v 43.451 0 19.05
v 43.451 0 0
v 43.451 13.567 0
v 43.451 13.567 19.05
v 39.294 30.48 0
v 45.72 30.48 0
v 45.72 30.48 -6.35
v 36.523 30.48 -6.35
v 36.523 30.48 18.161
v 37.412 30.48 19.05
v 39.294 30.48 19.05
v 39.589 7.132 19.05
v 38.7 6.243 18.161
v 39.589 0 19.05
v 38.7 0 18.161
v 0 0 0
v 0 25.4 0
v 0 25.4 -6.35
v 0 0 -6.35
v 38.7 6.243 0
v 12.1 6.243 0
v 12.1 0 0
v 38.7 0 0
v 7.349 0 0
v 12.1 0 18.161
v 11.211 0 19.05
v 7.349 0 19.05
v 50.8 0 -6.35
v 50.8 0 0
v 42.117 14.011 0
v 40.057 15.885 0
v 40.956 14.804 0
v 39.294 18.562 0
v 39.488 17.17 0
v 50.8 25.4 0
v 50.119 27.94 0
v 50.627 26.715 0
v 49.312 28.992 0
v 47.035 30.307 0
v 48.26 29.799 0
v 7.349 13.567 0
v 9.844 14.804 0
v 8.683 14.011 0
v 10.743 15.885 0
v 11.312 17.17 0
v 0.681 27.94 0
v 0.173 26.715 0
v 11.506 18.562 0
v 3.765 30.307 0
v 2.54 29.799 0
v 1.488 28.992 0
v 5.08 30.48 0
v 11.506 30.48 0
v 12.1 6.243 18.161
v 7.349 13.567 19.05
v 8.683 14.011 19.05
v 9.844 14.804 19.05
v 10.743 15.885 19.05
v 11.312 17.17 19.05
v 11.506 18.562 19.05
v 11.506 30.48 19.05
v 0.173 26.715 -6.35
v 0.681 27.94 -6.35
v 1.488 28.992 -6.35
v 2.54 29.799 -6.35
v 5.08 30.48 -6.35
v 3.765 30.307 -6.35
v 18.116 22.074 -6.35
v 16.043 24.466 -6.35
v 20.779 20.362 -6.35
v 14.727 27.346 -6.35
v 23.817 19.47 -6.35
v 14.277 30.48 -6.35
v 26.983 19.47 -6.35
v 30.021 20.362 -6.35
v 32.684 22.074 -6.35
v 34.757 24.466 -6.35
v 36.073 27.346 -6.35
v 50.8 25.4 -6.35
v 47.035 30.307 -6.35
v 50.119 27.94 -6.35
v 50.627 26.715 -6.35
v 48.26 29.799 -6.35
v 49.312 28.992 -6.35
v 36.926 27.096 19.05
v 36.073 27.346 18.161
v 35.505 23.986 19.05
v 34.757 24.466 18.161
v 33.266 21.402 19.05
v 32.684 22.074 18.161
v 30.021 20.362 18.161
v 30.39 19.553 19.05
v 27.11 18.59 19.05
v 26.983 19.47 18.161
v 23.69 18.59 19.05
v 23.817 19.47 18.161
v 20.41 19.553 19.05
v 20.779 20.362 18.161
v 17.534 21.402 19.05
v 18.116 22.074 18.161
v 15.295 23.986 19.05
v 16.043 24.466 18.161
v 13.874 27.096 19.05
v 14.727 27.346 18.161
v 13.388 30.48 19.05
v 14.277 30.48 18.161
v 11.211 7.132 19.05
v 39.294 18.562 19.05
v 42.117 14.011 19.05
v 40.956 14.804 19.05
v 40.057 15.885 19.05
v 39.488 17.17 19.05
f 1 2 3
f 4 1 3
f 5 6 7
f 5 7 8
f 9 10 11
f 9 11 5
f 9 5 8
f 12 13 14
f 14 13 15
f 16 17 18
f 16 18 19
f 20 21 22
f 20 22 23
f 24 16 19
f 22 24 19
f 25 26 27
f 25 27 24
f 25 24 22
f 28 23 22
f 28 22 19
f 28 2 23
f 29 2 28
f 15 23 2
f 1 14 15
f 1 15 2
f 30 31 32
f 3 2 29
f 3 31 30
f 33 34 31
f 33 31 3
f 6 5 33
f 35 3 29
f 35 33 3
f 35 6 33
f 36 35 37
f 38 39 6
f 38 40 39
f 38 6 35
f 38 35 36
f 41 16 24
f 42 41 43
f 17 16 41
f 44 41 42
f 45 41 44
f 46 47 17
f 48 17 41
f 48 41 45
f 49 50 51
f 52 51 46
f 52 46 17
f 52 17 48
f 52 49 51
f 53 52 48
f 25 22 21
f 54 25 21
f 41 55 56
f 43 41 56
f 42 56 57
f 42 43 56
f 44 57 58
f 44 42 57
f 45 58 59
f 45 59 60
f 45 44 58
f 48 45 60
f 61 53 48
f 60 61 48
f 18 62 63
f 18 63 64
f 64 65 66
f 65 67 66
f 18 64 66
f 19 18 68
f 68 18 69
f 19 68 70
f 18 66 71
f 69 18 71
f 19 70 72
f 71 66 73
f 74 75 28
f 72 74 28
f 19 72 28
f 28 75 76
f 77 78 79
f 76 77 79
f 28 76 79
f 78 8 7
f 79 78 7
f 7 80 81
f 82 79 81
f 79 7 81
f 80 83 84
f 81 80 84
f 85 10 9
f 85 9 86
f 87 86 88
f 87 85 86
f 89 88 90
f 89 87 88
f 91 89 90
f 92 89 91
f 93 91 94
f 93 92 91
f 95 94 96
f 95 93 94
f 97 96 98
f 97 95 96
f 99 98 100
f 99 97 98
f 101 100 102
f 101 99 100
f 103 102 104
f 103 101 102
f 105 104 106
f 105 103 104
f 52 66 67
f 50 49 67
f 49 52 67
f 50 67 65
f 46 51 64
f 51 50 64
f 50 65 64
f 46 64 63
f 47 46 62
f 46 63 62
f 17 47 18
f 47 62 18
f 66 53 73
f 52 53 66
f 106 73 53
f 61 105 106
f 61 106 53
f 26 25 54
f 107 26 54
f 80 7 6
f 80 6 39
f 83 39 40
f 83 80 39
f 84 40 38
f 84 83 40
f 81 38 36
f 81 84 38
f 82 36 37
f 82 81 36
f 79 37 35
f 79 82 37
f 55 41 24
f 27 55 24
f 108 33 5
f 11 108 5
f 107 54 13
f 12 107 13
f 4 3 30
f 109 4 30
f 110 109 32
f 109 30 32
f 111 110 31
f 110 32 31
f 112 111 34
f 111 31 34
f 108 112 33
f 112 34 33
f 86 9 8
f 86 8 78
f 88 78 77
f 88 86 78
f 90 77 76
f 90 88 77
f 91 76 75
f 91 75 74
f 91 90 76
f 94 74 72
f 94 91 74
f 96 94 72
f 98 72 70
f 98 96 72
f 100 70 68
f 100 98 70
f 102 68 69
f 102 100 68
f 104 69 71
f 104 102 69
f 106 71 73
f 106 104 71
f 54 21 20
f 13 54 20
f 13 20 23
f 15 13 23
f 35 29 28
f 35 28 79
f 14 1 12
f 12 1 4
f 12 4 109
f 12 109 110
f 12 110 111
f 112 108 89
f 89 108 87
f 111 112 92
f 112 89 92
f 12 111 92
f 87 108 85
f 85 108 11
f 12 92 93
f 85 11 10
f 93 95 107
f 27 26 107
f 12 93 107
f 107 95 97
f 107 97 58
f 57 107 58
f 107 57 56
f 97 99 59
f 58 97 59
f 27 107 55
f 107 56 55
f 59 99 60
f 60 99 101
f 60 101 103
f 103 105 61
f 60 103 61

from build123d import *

# Parameters (mm, degrees)
F1_DEPTH     = 19.05
F0_W         = 26.6001702666
F0_H         = 6.2427259982
F2_DEPTH     = 6.35
F3_T1_DEPTH  = 19.05
F3_T6_DEPTH  = 31.5386260012
F3_T8_DEPTH  = 31.75
F3_T10_DEPTH = 31.75
F4_SIZE      = 0.889


# Not quite as in the source:
# - a fillet or chamfer that OpenCascade refuses, or shapes differently, is made with other operations: its cross-section is extruded or revolved along the edge and cut away or added


with BuildPart() as f1:
    # F0 (on Top) → F1 (new body)
    with BuildSketch(Plane.XY):
        with BuildLine():
            Line((7.349026072, 13.5670155287), (7.349026072, 0))
            Line((7.349026072, 0), (12.0999148667, 0))
            Line((12.0999148667, 0), (12.0999148667, 6.2427259982))
            Line((12.0999148667, 6.2427259982), (38.7000851333, 6.2427259982))
            Line((38.7000851333, 6.2427259982), (38.7000851333, 0))
            Line((38.7000851333, 0), (43.450973928, 0))
            Line((43.450973928, 0), (43.450973928, 13.5670155287))
            Line((43.450973928, 13.5670155287), (39.2939448357, 13.5670155287))
            Line((39.2939448357, 13.5670155287), (39.2939448357, 30.48))
            Line((39.2939448357, 30.48), (36.5231766516, 30.48))
            ThreePointArc((36.5231766516, 30.48), (25.4, 19.3568233484), (14.2768233484, 30.48))
            Line((14.2768233484, 30.48), (11.5060551643, 30.48))
            Line((11.5060551643, 30.48), (11.5060551643, 13.5670155287))
            Line((11.5060551643, 13.5670155287), (7.349026072, 13.5670155287))
        make_face()
    extrude(amount=F1_DEPTH)

    # F0 (on Top) → F2 (join)
    with BuildSketch(Plane.XY):
        Polygon((0, 30.48), (0, 0), (7.349026072, 0), (7.349026072, 13.5670155287), (11.5060551643, 13.5670155287), (11.5060551643, 30.48), align=None)
        with Locations((25.4, 3.1213629991)):
            Rectangle(F0_W, F0_H)
        Polygon((43.450973928, 13.5670155287), (43.450973928, 0), (50.8, 0), (50.8, 30.48), (39.2939448357, 30.48), (39.2939448357, 13.5670155287), align=None)
        with BuildLine():
            Line((7.349026072, 13.5670155287), (7.349026072, 0))
            Line((7.349026072, 0), (12.0999148667, 0))
            Line((12.0999148667, 0), (12.0999148667, 6.2427259982))
            Line((12.0999148667, 6.2427259982), (38.7000851333, 6.2427259982))
            Line((38.7000851333, 6.2427259982), (38.7000851333, 0))
            Line((38.7000851333, 0), (43.450973928, 0))
            Line((43.450973928, 0), (43.450973928, 13.5670155287))
            Line((43.450973928, 13.5670155287), (39.2939448357, 13.5670155287))
            Line((39.2939448357, 13.5670155287), (39.2939448357, 30.48))
            Line((39.2939448357, 30.48), (36.5231766516, 30.48))
            ThreePointArc((36.5231766516, 30.48), (25.4, 19.3568233484), (14.2768233484, 30.48))
            Line((14.2768233484, 30.48), (11.5060551643, 30.48))
            Line((11.5060551643, 30.48), (11.5060551643, 13.5670155287))
            Line((11.5060551643, 13.5670155287), (7.349026072, 13.5670155287))
        make_face()
    extrude(amount=-F2_DEPTH)

    # F3: fillet of radius 5.08 on 4 edges, made by hand

    # F3_s2 → F3_t1 (join)
    with BuildSketch(Plane.XY):
        with BuildLine():
            ThreePointArc((7.349026072, 13.5670155287), (10.3308658007, 15.3130269169), (11.5060551643, 18.5624659292))
            Line((11.5060551643, 18.5624659292), (11.5060551643, 13.5670155287))
            Line((11.5060551643, 13.5670155287), (7.349026072, 13.5670155287))
        make_face()
    extrude(amount=F3_T1_DEPTH)


with BuildPart() as f3_tool4:
    # F3_s5 → F3_t6 (new body)
    with BuildSketch(Plane.XY.offset(-12.4886260012)):
        with BuildLine():
            ThreePointArc((43.450973928, 13.5670155287), (40.4691341993, 15.3130269169), (39.2939448357, 18.5624659292))
            Line((39.2939448357, 18.5624659292), (39.2939448357, 13.5670155287))
            Line((39.2939448357, 13.5670155287), (43.450973928, 13.5670155287))
        make_face()
    extrude(amount=F3_T6_DEPTH)

    split(bisect_by=Plane.XY.offset(-6.35), keep=Keep.TOP)


with BuildPart() as f1_1:
    add(f1.part)

    # F3_t3: union F3_tool4
    add(f3_tool4.part)

    # F3_s9 → F3_t8 (cut)
    with BuildSketch(Plane.XY.offset(-19.05)):
        with BuildLine():
            ThreePointArc((5.08, 30.48), (1.4878975516, 28.9921024484), (0, 25.4))
            Line((0, 25.4), (0, 30.48))
            Line((0, 30.48), (5.08, 30.48))
        make_face()
    extrude(amount=F3_T8_DEPTH, mode=Mode.SUBTRACT)

    # F3_s11 → F3_t10 (cut)
    with BuildSketch(Plane.XY.offset(-19.05)):
        with BuildLine():
            ThreePointArc((45.72, 30.48), (49.3121024484, 28.9921024484), (50.8, 25.4))
            Line((50.8, 25.4), (50.8, 30.48))
            Line((50.8, 30.48), (45.72, 30.48))
        make_face()
    extrude(amount=F3_T10_DEPTH, mode=Mode.SUBTRACT)

    # F4
    f4_edges = [f1_1.edges().sort_by_distance(p)[0] for p in [
        (25.4, 19.356823, 19.05),
        (25.4, 6.242726, 19.05),
        (38.700085, 3.121363, 19.05),
        (12.099915, 3.121363, 19.05),
    ]]
    chamfer(f4_edges, length=F4_SIZE)


solid = f1_1.part
